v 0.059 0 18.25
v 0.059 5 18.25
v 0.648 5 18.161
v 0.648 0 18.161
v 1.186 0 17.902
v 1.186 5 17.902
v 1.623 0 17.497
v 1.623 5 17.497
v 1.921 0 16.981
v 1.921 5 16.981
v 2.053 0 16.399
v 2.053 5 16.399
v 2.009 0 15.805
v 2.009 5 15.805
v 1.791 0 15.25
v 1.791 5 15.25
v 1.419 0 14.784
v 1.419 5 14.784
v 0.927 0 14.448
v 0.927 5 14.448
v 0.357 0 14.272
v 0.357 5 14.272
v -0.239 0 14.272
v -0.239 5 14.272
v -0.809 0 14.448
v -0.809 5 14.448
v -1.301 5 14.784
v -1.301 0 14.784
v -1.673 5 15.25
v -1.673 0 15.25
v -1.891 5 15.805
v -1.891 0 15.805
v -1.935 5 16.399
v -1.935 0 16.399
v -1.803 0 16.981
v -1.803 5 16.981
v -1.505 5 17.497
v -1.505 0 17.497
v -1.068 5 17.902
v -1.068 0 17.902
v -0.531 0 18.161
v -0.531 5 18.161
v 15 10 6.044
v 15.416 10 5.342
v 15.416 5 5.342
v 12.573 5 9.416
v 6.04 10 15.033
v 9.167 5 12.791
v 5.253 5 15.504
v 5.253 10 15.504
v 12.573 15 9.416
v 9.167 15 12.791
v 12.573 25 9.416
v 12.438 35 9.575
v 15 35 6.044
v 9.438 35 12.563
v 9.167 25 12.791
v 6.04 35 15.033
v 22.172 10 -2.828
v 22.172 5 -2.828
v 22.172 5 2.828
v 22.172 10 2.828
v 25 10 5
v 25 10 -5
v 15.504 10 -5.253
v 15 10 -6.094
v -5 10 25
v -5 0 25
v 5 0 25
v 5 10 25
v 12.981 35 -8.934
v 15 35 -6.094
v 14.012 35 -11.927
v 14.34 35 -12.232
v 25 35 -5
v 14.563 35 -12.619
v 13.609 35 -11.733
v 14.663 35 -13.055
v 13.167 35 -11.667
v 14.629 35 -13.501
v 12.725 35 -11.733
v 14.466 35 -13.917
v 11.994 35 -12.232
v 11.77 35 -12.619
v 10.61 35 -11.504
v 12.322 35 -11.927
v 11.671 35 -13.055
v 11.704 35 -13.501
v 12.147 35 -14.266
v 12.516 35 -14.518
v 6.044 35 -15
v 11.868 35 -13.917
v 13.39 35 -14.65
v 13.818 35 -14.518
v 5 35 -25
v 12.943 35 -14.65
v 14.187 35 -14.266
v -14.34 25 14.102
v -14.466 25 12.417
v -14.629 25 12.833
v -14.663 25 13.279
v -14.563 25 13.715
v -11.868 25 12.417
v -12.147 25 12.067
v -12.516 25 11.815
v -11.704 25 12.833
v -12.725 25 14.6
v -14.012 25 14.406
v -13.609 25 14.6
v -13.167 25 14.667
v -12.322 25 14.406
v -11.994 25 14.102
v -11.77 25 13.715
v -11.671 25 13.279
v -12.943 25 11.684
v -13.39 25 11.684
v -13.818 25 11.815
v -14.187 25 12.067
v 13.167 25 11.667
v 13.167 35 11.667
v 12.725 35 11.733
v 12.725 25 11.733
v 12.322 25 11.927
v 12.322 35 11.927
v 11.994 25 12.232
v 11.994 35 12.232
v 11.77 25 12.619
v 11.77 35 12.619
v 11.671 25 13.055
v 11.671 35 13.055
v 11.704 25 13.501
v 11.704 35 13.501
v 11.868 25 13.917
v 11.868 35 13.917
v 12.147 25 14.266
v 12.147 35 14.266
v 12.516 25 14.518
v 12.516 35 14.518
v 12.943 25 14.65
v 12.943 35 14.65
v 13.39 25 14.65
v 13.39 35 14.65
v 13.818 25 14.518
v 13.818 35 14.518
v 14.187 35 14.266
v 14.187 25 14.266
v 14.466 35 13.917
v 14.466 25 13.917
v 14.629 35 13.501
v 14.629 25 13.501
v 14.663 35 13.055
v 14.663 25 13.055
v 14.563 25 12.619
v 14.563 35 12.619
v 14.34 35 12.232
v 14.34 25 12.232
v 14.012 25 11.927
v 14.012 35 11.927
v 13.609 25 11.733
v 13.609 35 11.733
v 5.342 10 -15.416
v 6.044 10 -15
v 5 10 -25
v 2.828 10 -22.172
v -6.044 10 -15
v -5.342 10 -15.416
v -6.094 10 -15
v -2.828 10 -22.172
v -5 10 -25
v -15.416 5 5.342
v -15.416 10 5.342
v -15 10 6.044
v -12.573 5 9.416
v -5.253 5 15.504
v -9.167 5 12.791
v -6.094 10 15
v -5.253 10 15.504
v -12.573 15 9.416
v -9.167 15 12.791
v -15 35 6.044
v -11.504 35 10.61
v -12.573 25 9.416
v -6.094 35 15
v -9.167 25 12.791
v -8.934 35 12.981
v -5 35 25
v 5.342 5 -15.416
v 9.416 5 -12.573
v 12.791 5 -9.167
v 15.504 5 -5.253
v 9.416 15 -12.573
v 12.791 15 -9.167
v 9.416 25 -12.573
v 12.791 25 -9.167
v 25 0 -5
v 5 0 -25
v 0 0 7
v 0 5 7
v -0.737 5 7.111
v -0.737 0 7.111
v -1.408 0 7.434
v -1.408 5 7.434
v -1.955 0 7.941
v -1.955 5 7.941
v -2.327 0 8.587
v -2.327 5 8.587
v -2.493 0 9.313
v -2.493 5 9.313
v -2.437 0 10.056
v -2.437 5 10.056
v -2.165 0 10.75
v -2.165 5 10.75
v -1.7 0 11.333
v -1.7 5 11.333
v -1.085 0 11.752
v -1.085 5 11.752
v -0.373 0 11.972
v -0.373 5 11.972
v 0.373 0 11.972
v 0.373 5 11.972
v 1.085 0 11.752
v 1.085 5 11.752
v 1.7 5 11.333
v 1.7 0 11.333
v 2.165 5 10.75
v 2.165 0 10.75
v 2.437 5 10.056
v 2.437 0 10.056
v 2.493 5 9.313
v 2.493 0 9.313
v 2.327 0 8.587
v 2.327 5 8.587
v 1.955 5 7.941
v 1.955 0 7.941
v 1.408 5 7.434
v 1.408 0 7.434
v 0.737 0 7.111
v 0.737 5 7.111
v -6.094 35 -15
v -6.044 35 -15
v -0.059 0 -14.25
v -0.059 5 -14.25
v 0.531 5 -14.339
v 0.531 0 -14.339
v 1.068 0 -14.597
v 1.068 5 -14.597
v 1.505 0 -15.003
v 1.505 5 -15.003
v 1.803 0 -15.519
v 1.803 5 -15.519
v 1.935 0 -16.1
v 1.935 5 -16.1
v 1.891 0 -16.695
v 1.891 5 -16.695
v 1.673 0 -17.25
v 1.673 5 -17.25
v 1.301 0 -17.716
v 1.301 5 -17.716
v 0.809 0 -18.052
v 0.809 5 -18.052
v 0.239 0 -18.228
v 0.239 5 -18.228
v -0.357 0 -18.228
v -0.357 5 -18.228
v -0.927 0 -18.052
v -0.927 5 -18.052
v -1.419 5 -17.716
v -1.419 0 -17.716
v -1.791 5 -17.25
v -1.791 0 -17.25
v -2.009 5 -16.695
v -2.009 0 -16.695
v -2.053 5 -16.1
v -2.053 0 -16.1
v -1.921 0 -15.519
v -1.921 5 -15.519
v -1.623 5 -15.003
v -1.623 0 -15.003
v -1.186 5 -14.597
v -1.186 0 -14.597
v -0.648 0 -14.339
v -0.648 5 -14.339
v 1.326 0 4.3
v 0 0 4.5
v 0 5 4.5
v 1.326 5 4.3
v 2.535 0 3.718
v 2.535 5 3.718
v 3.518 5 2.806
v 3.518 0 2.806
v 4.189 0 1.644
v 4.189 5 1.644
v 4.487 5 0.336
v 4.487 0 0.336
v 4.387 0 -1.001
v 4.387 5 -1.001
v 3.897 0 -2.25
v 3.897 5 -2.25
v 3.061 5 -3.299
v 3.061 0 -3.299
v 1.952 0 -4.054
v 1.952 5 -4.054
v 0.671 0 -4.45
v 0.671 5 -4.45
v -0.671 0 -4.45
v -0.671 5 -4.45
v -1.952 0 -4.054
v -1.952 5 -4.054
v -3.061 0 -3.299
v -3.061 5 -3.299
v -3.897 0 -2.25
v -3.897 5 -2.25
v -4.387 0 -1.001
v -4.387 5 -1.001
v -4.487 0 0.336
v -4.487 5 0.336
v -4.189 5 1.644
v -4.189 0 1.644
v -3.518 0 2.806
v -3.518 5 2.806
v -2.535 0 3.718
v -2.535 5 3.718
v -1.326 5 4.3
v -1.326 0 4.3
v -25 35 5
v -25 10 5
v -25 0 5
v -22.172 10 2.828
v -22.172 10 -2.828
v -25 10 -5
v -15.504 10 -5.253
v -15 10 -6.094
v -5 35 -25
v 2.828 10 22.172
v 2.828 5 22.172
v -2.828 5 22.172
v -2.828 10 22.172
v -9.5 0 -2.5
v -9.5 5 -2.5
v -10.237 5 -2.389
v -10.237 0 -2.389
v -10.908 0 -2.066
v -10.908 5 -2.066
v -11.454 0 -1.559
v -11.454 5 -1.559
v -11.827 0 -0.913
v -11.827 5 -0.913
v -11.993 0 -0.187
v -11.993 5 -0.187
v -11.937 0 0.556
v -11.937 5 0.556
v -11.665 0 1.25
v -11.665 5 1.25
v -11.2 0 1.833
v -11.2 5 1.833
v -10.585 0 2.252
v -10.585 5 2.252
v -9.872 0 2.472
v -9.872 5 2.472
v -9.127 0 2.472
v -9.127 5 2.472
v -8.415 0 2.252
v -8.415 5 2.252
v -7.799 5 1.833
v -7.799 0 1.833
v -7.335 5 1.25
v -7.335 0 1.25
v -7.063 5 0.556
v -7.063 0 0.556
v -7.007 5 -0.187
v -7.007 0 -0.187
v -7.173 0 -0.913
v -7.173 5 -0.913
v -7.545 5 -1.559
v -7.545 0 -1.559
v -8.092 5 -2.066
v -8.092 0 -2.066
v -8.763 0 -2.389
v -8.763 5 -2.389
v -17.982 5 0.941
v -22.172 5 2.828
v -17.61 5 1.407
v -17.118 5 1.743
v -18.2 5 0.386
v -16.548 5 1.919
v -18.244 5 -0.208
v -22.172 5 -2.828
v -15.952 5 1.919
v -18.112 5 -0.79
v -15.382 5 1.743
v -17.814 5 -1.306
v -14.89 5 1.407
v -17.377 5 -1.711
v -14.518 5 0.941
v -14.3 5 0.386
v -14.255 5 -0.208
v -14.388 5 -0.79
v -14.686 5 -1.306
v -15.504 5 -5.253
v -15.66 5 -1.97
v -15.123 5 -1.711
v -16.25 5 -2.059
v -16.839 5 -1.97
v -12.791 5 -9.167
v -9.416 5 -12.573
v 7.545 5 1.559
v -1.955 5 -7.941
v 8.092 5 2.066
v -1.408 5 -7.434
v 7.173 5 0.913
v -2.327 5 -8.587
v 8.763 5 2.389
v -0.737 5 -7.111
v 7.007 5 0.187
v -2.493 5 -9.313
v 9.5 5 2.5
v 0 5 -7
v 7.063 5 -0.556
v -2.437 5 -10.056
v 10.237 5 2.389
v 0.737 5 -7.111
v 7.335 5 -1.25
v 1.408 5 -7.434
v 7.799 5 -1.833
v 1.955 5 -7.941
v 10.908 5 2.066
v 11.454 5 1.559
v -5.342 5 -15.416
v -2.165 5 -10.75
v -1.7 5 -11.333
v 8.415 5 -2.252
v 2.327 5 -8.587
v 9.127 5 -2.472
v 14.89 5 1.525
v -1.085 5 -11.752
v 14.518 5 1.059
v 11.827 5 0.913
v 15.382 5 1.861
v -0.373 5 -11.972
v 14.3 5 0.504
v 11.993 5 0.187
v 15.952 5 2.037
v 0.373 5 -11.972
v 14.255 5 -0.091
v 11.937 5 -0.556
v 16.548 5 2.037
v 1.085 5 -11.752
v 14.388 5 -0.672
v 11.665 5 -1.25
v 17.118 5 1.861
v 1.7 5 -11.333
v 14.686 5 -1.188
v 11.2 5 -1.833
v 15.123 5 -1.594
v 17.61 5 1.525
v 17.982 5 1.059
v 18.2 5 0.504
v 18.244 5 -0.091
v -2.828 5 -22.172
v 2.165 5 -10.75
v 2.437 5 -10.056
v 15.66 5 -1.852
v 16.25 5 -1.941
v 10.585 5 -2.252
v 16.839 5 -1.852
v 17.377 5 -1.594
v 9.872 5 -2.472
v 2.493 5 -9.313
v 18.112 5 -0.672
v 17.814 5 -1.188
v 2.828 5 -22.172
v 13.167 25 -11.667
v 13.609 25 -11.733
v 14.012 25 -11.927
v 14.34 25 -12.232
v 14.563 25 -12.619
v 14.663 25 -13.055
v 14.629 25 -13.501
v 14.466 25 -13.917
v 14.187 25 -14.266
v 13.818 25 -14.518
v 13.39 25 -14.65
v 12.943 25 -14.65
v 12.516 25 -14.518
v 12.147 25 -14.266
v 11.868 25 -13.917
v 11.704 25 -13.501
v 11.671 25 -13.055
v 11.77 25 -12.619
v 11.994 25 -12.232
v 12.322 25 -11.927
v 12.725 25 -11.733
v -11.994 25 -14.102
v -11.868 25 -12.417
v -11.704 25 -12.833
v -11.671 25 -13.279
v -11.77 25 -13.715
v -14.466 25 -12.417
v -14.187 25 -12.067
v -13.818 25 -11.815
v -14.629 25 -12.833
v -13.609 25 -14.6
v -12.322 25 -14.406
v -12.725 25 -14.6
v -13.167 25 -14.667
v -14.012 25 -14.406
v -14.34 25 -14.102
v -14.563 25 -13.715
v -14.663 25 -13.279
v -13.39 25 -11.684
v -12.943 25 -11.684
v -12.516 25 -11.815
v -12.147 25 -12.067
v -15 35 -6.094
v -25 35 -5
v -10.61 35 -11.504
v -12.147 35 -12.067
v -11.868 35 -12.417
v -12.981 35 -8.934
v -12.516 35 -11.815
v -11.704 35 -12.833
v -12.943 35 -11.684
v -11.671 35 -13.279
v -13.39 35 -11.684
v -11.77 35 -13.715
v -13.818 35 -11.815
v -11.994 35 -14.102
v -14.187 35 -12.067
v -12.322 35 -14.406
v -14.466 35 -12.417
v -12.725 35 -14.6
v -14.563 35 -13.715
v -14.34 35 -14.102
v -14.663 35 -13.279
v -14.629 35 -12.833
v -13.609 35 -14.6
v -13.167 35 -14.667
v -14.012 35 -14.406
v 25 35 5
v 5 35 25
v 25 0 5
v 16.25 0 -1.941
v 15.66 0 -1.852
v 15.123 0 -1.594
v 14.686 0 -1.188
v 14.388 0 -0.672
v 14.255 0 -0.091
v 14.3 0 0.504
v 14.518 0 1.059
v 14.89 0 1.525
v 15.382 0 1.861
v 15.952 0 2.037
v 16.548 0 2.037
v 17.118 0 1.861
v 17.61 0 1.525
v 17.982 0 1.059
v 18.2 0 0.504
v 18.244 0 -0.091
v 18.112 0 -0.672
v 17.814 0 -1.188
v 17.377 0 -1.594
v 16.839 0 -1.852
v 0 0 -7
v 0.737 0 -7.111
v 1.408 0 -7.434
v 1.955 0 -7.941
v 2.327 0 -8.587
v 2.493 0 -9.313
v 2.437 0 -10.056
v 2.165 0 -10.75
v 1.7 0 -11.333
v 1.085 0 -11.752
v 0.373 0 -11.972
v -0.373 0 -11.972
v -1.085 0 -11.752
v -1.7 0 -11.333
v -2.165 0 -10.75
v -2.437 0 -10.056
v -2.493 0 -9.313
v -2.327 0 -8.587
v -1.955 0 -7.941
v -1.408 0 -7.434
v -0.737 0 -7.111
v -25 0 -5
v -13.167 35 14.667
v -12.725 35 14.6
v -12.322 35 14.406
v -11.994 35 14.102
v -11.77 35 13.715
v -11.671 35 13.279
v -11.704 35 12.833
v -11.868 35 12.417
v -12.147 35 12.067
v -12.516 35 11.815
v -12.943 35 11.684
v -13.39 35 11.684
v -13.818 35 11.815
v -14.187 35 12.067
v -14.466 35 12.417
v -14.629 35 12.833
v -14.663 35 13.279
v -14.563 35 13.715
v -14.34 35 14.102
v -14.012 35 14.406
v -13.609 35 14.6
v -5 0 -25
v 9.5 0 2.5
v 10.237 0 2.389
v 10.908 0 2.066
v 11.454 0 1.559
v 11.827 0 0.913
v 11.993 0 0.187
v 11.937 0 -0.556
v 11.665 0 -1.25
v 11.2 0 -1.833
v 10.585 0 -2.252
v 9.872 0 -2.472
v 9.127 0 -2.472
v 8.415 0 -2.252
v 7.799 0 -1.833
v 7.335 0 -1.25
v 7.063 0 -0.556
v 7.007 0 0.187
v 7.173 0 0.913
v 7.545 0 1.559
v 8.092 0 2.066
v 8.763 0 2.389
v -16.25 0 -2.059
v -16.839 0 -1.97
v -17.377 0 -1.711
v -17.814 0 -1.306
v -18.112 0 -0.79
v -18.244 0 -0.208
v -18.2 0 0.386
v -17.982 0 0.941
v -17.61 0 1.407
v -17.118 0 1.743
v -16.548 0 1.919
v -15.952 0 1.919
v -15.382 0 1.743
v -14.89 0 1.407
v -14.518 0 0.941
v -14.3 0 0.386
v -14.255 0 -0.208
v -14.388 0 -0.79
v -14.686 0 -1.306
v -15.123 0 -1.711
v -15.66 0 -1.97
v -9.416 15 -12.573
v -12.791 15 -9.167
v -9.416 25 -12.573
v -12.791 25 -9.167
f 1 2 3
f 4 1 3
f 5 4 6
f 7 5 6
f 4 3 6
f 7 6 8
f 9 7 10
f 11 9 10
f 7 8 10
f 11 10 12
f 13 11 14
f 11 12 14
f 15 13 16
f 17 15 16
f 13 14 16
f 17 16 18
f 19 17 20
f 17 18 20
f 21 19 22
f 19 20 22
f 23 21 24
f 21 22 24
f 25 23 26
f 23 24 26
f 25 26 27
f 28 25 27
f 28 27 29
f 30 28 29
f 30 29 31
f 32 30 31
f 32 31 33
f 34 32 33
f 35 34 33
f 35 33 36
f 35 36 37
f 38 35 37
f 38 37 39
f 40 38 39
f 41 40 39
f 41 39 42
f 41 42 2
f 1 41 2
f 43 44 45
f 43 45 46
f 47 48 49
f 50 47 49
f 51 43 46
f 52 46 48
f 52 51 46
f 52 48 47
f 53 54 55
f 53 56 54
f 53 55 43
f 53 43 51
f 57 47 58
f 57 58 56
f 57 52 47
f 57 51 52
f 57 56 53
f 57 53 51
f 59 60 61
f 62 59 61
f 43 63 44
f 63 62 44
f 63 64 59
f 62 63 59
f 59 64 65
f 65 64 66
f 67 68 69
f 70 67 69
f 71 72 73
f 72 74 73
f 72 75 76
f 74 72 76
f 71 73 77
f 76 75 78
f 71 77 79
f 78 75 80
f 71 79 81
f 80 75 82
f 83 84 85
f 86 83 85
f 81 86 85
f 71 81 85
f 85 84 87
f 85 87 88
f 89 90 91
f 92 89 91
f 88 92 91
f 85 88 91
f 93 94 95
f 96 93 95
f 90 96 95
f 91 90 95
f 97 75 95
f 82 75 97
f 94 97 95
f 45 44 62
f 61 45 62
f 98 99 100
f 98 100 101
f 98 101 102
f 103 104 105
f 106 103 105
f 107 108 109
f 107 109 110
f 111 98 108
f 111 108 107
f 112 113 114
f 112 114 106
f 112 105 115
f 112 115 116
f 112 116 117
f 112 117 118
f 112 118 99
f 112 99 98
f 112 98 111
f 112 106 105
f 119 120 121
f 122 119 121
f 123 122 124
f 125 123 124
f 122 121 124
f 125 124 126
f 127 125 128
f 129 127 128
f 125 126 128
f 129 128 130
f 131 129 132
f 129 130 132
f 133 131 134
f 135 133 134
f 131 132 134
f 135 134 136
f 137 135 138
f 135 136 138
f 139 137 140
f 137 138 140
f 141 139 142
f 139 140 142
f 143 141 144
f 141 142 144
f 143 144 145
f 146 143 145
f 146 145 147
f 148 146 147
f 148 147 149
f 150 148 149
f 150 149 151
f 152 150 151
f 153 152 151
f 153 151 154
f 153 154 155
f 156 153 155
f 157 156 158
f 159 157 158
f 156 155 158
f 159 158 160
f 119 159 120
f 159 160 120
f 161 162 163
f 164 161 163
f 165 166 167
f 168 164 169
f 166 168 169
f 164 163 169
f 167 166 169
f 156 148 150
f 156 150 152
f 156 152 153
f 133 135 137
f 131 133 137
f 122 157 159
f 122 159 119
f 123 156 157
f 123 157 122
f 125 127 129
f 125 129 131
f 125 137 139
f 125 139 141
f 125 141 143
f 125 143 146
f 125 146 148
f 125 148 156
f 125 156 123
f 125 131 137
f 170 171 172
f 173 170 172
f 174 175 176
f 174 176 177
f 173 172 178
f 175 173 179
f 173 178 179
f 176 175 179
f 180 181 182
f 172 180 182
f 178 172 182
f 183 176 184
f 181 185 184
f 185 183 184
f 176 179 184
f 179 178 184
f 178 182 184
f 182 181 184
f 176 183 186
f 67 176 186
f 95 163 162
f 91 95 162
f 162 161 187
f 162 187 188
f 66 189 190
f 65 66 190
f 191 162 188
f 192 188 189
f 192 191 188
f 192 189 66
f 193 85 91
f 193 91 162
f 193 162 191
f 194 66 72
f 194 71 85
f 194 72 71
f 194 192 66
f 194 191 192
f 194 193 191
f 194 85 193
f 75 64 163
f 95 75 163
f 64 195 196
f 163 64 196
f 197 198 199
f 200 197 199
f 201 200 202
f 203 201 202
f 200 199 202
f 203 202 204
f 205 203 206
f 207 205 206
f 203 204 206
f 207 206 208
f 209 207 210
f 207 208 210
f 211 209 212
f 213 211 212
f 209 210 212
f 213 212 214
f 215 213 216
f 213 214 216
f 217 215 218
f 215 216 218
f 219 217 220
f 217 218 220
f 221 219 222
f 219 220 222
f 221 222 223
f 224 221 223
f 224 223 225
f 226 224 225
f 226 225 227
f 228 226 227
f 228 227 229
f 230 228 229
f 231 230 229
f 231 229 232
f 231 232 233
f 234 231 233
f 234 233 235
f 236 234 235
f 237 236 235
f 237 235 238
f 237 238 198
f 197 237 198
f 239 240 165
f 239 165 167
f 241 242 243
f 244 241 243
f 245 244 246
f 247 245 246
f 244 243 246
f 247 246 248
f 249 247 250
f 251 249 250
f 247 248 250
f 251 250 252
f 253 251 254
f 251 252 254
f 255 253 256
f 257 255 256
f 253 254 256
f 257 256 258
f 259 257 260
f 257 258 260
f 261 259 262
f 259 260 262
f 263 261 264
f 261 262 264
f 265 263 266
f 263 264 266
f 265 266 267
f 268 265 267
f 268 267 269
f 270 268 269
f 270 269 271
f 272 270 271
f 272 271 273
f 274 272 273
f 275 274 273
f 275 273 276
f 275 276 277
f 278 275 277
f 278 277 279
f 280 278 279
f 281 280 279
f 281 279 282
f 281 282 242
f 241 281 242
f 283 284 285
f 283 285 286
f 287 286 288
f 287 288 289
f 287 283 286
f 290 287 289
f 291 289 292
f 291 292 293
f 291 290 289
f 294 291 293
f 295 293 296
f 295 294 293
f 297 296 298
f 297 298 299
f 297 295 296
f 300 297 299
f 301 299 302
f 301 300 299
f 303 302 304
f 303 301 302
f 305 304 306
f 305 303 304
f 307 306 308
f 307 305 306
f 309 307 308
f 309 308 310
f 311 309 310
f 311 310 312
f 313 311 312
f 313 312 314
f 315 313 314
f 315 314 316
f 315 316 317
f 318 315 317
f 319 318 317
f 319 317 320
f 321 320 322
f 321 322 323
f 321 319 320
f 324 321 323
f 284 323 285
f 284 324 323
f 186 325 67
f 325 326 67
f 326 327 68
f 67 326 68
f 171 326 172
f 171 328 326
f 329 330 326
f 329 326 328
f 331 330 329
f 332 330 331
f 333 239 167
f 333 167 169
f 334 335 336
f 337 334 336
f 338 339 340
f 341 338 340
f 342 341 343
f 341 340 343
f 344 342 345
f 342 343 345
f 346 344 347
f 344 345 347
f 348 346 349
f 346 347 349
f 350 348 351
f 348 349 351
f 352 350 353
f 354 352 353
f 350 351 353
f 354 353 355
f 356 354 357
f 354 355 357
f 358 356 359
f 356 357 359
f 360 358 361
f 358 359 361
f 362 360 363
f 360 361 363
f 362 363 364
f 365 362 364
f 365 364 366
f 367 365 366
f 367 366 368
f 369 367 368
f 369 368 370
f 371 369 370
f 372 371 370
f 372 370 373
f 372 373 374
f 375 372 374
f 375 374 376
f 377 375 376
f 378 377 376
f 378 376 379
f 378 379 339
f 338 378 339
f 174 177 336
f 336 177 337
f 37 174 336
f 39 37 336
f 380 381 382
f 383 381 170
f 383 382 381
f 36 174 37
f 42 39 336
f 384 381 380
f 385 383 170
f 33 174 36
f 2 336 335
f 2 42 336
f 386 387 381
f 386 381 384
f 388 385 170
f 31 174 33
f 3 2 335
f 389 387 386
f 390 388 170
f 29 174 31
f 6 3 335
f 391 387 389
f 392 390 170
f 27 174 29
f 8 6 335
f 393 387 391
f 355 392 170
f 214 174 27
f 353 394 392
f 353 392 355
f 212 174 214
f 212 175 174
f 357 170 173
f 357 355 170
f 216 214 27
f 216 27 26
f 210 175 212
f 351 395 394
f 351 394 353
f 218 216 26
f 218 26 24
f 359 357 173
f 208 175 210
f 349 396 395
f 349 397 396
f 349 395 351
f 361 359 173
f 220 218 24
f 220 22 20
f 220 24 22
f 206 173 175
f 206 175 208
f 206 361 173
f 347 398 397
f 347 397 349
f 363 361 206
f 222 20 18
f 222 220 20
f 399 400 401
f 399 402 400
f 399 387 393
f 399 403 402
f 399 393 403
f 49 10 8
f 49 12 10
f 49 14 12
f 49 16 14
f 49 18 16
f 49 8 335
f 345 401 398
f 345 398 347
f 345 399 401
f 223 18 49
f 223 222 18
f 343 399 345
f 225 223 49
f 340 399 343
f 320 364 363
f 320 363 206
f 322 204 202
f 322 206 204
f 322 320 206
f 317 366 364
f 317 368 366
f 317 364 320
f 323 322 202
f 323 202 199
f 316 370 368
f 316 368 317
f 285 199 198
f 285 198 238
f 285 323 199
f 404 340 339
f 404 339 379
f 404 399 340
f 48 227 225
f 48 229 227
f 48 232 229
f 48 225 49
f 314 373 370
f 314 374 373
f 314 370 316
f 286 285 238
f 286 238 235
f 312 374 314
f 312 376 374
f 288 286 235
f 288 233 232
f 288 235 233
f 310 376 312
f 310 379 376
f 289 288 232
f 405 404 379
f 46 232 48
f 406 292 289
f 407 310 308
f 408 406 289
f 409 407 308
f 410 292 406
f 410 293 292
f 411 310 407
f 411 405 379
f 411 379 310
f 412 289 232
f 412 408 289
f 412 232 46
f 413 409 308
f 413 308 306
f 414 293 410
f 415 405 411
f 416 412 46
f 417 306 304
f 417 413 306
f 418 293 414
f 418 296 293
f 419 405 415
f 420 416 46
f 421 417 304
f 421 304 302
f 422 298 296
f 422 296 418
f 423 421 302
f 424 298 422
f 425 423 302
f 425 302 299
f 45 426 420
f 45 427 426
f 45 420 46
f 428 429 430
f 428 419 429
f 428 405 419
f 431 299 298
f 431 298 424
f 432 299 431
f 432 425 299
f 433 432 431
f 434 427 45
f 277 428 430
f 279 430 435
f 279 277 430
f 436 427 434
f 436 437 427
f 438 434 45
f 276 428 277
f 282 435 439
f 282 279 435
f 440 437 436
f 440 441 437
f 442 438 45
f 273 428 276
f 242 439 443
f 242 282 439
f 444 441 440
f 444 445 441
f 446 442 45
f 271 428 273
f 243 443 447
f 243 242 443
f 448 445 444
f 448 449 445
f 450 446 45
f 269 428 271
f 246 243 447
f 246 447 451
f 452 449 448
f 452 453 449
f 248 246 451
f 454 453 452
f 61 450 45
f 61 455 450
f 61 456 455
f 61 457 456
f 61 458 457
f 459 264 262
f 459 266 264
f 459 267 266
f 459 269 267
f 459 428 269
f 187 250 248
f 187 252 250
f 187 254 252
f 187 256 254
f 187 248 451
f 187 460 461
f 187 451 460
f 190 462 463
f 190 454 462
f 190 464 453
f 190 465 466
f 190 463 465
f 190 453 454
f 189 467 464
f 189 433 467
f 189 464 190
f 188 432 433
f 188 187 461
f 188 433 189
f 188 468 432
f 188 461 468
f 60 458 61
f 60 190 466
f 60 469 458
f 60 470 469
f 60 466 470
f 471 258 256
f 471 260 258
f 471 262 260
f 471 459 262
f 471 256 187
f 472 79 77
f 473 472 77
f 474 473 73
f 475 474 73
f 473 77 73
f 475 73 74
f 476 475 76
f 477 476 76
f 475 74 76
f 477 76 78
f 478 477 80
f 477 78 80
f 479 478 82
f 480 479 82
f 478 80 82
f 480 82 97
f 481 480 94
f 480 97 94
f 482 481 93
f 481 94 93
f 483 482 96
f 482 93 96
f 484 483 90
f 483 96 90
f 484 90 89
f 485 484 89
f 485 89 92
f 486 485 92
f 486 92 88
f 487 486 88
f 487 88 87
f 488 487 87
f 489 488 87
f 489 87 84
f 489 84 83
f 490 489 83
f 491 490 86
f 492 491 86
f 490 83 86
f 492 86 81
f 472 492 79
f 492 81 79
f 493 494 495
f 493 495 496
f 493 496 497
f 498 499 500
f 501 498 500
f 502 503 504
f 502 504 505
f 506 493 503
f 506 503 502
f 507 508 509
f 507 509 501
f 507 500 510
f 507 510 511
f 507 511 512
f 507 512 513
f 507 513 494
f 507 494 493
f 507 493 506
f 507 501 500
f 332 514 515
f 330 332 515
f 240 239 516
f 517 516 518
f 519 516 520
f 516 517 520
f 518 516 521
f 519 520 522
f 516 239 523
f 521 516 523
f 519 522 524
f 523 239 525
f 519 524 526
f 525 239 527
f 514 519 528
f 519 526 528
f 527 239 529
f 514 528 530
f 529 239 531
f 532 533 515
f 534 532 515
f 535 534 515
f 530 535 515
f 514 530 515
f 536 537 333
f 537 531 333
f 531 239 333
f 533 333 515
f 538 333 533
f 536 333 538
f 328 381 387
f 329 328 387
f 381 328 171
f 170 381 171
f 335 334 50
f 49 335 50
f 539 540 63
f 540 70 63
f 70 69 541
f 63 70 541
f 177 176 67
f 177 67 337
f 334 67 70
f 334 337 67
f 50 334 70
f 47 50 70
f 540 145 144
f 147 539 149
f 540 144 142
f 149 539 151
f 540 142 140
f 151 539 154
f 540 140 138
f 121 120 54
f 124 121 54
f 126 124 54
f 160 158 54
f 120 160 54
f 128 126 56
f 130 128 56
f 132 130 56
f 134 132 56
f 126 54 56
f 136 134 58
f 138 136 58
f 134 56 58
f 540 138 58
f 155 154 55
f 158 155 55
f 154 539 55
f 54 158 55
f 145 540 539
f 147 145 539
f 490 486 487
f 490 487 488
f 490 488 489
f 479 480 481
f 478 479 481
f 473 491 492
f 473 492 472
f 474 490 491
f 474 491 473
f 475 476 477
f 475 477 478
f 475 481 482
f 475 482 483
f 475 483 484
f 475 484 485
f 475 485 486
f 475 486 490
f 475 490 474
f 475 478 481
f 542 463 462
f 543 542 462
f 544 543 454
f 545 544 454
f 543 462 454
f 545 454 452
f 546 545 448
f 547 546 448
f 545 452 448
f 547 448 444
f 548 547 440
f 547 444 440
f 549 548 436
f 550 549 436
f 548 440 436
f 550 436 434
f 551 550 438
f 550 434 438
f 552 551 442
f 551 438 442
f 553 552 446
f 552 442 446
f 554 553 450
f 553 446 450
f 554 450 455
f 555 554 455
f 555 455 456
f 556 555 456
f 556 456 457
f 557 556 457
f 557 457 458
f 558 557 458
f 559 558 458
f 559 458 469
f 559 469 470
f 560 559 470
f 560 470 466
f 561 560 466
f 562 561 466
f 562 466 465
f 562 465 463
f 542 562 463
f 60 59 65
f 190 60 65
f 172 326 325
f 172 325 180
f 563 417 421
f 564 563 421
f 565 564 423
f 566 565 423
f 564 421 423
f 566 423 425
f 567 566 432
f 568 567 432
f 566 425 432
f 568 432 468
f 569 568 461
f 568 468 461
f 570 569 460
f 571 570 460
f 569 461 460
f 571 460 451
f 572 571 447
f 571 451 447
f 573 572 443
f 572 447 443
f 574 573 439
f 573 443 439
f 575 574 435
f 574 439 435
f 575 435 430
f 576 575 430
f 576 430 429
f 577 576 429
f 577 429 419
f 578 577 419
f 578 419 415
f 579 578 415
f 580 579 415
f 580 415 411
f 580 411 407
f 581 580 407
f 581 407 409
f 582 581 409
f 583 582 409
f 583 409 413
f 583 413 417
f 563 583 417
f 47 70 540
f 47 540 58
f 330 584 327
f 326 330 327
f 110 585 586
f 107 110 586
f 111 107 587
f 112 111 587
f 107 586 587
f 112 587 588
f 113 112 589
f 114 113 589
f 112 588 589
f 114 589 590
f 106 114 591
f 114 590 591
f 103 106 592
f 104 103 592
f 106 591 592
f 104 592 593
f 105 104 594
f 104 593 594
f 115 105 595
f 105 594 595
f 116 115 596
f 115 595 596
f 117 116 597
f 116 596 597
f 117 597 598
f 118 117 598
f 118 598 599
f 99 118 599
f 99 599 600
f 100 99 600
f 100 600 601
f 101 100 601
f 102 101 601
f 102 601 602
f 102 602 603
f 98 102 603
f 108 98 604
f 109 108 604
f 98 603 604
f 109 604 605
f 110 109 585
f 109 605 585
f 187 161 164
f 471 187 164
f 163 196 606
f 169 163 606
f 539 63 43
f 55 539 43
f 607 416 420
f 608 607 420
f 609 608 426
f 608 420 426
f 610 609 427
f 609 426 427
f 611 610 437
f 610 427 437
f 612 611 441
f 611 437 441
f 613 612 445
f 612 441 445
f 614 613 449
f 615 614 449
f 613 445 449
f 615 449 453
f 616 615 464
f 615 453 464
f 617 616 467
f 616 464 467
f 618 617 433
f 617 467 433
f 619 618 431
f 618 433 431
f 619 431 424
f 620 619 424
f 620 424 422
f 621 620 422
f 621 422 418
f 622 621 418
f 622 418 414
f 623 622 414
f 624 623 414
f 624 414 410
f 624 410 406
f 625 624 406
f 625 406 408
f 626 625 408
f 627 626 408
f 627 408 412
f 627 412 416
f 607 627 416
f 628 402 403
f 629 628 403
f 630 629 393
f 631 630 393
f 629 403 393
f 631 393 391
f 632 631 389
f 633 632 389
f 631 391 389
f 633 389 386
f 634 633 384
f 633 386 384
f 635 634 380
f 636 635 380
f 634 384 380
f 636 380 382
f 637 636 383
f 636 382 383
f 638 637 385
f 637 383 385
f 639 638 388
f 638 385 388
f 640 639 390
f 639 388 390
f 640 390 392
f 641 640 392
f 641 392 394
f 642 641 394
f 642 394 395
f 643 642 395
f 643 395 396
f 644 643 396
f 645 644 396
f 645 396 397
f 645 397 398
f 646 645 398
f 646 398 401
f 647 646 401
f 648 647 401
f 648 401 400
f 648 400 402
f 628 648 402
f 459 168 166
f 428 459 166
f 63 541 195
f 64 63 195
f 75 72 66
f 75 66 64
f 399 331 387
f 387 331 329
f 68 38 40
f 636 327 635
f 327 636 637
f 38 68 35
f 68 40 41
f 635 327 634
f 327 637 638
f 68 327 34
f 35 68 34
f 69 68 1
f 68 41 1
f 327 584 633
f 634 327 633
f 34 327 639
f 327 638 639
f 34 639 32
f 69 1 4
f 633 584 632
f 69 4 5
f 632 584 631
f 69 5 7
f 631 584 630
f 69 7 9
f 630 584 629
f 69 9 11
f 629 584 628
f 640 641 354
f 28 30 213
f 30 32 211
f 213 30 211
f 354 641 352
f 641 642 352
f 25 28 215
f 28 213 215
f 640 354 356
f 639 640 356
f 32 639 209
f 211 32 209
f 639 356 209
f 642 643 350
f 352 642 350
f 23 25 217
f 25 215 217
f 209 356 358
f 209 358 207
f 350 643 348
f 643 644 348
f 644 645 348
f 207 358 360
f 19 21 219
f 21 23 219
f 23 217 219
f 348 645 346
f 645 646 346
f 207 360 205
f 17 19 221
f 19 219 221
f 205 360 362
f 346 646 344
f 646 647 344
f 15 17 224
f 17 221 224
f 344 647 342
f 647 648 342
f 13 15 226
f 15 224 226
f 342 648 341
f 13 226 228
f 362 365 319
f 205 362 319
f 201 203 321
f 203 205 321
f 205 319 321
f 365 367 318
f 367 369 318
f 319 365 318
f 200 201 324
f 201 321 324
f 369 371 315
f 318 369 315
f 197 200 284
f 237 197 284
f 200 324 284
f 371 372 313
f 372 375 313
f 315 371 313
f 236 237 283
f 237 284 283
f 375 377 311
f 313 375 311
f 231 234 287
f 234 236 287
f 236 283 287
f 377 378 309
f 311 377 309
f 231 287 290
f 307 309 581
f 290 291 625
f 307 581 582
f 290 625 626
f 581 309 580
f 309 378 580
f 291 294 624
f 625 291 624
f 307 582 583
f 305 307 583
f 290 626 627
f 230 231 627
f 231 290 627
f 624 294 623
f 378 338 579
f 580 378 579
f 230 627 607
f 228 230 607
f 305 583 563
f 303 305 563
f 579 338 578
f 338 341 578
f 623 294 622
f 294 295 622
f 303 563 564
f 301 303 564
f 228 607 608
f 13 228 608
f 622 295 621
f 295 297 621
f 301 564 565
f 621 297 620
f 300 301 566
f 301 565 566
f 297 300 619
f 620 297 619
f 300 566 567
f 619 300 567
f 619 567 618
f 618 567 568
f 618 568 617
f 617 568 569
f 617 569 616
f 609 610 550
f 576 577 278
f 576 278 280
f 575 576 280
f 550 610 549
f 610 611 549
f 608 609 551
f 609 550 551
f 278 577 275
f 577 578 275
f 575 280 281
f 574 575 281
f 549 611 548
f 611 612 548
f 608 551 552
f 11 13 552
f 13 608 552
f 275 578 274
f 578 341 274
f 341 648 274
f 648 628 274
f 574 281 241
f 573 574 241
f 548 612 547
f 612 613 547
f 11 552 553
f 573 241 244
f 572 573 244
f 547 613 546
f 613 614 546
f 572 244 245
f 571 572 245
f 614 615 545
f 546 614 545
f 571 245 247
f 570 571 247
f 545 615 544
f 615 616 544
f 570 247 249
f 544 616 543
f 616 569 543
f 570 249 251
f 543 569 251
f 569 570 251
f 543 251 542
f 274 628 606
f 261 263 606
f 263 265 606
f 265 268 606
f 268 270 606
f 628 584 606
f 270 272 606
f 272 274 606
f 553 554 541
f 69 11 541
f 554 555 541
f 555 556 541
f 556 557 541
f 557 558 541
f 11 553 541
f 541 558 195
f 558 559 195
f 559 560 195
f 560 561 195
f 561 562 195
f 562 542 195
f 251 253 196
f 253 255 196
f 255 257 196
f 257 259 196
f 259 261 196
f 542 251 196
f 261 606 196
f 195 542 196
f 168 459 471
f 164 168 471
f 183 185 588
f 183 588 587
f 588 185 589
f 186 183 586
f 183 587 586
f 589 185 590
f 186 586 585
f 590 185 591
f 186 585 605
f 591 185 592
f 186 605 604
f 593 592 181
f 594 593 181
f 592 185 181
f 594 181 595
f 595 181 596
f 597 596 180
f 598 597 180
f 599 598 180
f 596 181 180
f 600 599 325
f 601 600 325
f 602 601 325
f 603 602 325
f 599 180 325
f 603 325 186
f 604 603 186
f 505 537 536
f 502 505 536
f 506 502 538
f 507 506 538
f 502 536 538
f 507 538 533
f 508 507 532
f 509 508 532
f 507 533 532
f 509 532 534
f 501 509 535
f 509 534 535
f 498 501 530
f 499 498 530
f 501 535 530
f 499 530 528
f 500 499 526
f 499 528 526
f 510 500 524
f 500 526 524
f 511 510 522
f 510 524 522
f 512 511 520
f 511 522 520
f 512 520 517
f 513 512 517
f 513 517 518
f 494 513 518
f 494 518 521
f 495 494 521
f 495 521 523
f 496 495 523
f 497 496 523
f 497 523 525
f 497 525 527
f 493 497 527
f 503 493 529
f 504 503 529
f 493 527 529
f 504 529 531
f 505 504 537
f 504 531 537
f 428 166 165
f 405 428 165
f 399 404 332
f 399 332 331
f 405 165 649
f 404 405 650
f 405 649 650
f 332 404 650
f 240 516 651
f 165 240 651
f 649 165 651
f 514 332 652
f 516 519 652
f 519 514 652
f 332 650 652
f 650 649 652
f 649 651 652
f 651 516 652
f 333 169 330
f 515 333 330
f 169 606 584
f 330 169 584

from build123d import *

# Parameters (mm, degrees)
SKETCH1_W           = 50
SKETCH1_H           = 50
SKETCH1_R           = 4.5
BOSS_EXTRUDE1_DEPTH = 5
SKETCH2_R           = 2
CUT_EXTRUDE1_DEPTH  = 36.707142143
BOSS_EXTRUDE2_DEPTH = 30
BOSS_EXTRUDE3_DEPTH = 30
CUT_EXTRUDE5_DEPTH  = 25
SKETCH9_R           = 2.5
CUT_EXTRUDE8_DEPTH  = 47.36809265
SKETCH10_R          = 1.5
CUT_EXTRUDE9_DEPTH  = 10


with BuildPart() as part:
    # Sketch1 → Boss-Extrude1 (new body)
    with BuildSketch(Plane(origin=(0, 0, 0), x_dir=(1, 0, 0), z_dir=(0, 1, 0))):
        Rectangle(SKETCH1_W, SKETCH1_H)
        with Locations(Location((0, 0, 0), (0, 0, 270))):
            Circle(SKETCH1_R, mode=Mode.SUBTRACT)
    extrude(amount=BOSS_EXTRUDE1_DEPTH)

    # Sketch2 → Cut-Extrude1 (cut, through all)
    with BuildSketch(Plane(origin=(0, 5, 0), x_dir=(1, 0, 0), z_dir=(0, 1, 0))):
        with Locations(Location((-0.058911488, 16.249893213, 0), (0, 0, 270))):
            Circle(SKETCH2_R)
        with Locations(Location((16.249893213, -0.058911488, 0), (0, 0, 90))):
            Circle(SKETCH2_R)
        with Locations(Location((0.058911488, -16.249893213, 0), (0, 0, 270))):
            Circle(SKETCH2_R)
        with Locations(Location((-16.249893213, 0.058911488, 0), (0, 0, 90))):
            Circle(SKETCH2_R)
        Polygon((-25, 25), (-25, 5), (-5, 25), align=None)
        Polygon((25, -25), (5, -25), (25, -5), align=None)
        Polygon((-25, -25), (-25, -5), (-5, -25), align=None)
        Polygon((25, 25), (25, 5), (5, 25), align=None)
    extrude(amount=-CUT_EXTRUDE1_DEPTH, mode=Mode.SUBTRACT)

    # Sketch3 → Boss-Extrude2 (add)
    with BuildSketch(Plane(origin=(0, 5, 0), x_dir=(1, 0, 0), z_dir=(0, 1, 0))):
        Polygon((-5, 25), (-7.828427125, 22.171572875), (-22.171572875, 7.828427125), (-25, 5), (-25, -5), (-22.171572875, -7.828427125), (-5, -25), (0, -25), (5, -25), (7.828427125, -22.171572875), (22.171572875, -7.828427125), (25, -5), (25, 5), (7.828427125, 22.171572875), (5, 25), align=None)
        Polygon((-2.828427125, -22.171572875), (-22.171572875, -2.828427125), (-22.171572875, 2.828427125), (-2.828427125, 22.171572875), (2.828427125, 22.171572875), (22.171572875, 2.828427125), (22.171572875, -2.828427125), (2.828427125, -22.171572875), align=None, mode=Mode.SUBTRACT)
    extrude(amount=BOSS_EXTRUDE2_DEPTH)

    # Sketch4 → Boss-Extrude3 (add)
    with BuildSketch(Plane(origin=(0, 35, 0), x_dir=(1, 0, 0), z_dir=(0, 1, 0))):
        with BuildLine():
            add(Edge.make_bspline(
                [(-5.341714296, 15.415645017), (-9.777866181, 12.873181646), (-13.108736095, 9.402087486), (-15.504012831, 5.253346482)],
                knots=[0, 0, 0, 0, 1, 1, 1, 1], degree=3))
            Line((-15.504012831, 5.253346482), (-22.171572875, 2.828427125))
            Line((-22.171572875, 2.828427125), (-2.828427125, 22.171572875))
            Line((-2.828427125, 22.171572875), (-5.341714296, 15.415645017))
        make_face()
        with BuildLine():
            Line((5.341714296, 15.415645017), (2.828427125, 22.171572875))
            Line((2.828427125, 22.171572875), (22.171572875, 2.828427125))
            Line((22.171572875, 2.828427125), (15.504012831, 5.253346482))
            add(Edge.make_bspline(
                [(5.341714296, 15.415645017), (9.777866181, 12.873181646), (13.108736095, 9.402087486), (15.504012831, 5.253346482)],
                knots=[0, 0, 0, 0, 1, 1, 1, 1], degree=3))
        make_face()
        with BuildLine():
            Line((15.415645017, -5.341714296), (22.171572875, -2.828427125))
            Line((22.171572875, -2.828427125), (2.828427125, -22.171572875))
            Line((2.828427125, -22.171572875), (5.253346482, -15.504012831))
            add(Edge.make_bspline(
                [(15.415645017, -5.341714296), (12.873181646, -9.777866181), (9.402087486, -13.108736095), (5.253346482, -15.504012831)],
                knots=[0, 0, 0, 0, 1, 1, 1, 1], degree=3))
        make_face()
        with BuildLine():
            add(Edge.make_bspline(
                [(-15.415645017, -5.341714296), (-12.873181646, -9.777866181), (-9.402087486, -13.108736095), (-5.253346482, -15.504012831)],
                knots=[0, 0, 0, 0, 1, 1, 1, 1], degree=3))
            Line((-5.253346482, -15.504012831), (-2.828427125, -22.171572875))
            Line((-2.828427125, -22.171572875), (-22.171572875, -2.828427125))
            Line((-22.171572875, -2.828427125), (-15.415645017, -5.341714296))
        make_face()
    extrude(amount=-BOSS_EXTRUDE3_DEPTH)

    # Sketch7 → Cut-Extrude5 (cut)
    with BuildSketch(Plane(origin=(0, 35, 0), x_dir=(1, 0, 0), z_dir=(0, 1, 0))):
        Polygon((-25, 5), (-25, -5), (-14.999999986, -6.043670064), (-14.999999986, 6.093977805), align=None)
        Polygon((25, -5), (14.999999986, -6.043670064), (14.999999986, 6.093977805), (25, 5), align=None)
        Polygon((-5, -25), (5, -25), (6.043670064, -14.999999986), (-6.093977805, -14.999999986), align=None)
        Polygon((5, 25), (6.043670064, 14.999999986), (-6.093977805, 14.999999986), (-5, 25), align=None)
    extrude(amount=-CUT_EXTRUDE5_DEPTH, mode=Mode.SUBTRACT)

    # Sketch9 → Cut-Extrude8 (cut, through all)
    with BuildSketch(Plane(origin=(0, 5, 0), x_dir=(1, 0, 0), z_dir=(0, 1, 0))):
        with Locations(Location((0, 9.499893213, 0), (0, 0, 270))):
            Circle(SKETCH9_R)
        with Locations(Location((0, -9.499893213, 0), (0, 0, 90))):
            Circle(SKETCH9_R)
        with Locations(Location((9.499893213, 0, 0), (0, 0, 270))):
            Circle(SKETCH9_R)
        with Locations(Location((-9.499893213, 0, 0), (0, 0, 90))):
            Circle(SKETCH9_R)
    extrude(amount=-CUT_EXTRUDE8_DEPTH, mode=Mode.SUBTRACT)

    # Sketch10 → Cut-Extrude9 (cut)
    with BuildSketch(Plane(origin=(0, 35, 0), x_dir=(1, 0, 0), z_dir=(0, 1, 0))):
        with Locations(Location((13.166804189, 13.166804189, 0), (0, 0, 270))):
            Circle(SKETCH10_R)
        with Locations(Location((-13.166804189, 13.166804189, 0), (0, 0, 90))):
            Circle(SKETCH10_R)
        with Locations(Location((-13.166804189, -13.166804189, 0), (0, 0, 270))):
            Circle(SKETCH10_R)
        with Locations(Location((13.166804189, -13.166804189, 0), (0, 0, 90))):
            Circle(SKETCH10_R)
    extrude(amount=-CUT_EXTRUDE9_DEPTH, mode=Mode.SUBTRACT)


solid = part.part
